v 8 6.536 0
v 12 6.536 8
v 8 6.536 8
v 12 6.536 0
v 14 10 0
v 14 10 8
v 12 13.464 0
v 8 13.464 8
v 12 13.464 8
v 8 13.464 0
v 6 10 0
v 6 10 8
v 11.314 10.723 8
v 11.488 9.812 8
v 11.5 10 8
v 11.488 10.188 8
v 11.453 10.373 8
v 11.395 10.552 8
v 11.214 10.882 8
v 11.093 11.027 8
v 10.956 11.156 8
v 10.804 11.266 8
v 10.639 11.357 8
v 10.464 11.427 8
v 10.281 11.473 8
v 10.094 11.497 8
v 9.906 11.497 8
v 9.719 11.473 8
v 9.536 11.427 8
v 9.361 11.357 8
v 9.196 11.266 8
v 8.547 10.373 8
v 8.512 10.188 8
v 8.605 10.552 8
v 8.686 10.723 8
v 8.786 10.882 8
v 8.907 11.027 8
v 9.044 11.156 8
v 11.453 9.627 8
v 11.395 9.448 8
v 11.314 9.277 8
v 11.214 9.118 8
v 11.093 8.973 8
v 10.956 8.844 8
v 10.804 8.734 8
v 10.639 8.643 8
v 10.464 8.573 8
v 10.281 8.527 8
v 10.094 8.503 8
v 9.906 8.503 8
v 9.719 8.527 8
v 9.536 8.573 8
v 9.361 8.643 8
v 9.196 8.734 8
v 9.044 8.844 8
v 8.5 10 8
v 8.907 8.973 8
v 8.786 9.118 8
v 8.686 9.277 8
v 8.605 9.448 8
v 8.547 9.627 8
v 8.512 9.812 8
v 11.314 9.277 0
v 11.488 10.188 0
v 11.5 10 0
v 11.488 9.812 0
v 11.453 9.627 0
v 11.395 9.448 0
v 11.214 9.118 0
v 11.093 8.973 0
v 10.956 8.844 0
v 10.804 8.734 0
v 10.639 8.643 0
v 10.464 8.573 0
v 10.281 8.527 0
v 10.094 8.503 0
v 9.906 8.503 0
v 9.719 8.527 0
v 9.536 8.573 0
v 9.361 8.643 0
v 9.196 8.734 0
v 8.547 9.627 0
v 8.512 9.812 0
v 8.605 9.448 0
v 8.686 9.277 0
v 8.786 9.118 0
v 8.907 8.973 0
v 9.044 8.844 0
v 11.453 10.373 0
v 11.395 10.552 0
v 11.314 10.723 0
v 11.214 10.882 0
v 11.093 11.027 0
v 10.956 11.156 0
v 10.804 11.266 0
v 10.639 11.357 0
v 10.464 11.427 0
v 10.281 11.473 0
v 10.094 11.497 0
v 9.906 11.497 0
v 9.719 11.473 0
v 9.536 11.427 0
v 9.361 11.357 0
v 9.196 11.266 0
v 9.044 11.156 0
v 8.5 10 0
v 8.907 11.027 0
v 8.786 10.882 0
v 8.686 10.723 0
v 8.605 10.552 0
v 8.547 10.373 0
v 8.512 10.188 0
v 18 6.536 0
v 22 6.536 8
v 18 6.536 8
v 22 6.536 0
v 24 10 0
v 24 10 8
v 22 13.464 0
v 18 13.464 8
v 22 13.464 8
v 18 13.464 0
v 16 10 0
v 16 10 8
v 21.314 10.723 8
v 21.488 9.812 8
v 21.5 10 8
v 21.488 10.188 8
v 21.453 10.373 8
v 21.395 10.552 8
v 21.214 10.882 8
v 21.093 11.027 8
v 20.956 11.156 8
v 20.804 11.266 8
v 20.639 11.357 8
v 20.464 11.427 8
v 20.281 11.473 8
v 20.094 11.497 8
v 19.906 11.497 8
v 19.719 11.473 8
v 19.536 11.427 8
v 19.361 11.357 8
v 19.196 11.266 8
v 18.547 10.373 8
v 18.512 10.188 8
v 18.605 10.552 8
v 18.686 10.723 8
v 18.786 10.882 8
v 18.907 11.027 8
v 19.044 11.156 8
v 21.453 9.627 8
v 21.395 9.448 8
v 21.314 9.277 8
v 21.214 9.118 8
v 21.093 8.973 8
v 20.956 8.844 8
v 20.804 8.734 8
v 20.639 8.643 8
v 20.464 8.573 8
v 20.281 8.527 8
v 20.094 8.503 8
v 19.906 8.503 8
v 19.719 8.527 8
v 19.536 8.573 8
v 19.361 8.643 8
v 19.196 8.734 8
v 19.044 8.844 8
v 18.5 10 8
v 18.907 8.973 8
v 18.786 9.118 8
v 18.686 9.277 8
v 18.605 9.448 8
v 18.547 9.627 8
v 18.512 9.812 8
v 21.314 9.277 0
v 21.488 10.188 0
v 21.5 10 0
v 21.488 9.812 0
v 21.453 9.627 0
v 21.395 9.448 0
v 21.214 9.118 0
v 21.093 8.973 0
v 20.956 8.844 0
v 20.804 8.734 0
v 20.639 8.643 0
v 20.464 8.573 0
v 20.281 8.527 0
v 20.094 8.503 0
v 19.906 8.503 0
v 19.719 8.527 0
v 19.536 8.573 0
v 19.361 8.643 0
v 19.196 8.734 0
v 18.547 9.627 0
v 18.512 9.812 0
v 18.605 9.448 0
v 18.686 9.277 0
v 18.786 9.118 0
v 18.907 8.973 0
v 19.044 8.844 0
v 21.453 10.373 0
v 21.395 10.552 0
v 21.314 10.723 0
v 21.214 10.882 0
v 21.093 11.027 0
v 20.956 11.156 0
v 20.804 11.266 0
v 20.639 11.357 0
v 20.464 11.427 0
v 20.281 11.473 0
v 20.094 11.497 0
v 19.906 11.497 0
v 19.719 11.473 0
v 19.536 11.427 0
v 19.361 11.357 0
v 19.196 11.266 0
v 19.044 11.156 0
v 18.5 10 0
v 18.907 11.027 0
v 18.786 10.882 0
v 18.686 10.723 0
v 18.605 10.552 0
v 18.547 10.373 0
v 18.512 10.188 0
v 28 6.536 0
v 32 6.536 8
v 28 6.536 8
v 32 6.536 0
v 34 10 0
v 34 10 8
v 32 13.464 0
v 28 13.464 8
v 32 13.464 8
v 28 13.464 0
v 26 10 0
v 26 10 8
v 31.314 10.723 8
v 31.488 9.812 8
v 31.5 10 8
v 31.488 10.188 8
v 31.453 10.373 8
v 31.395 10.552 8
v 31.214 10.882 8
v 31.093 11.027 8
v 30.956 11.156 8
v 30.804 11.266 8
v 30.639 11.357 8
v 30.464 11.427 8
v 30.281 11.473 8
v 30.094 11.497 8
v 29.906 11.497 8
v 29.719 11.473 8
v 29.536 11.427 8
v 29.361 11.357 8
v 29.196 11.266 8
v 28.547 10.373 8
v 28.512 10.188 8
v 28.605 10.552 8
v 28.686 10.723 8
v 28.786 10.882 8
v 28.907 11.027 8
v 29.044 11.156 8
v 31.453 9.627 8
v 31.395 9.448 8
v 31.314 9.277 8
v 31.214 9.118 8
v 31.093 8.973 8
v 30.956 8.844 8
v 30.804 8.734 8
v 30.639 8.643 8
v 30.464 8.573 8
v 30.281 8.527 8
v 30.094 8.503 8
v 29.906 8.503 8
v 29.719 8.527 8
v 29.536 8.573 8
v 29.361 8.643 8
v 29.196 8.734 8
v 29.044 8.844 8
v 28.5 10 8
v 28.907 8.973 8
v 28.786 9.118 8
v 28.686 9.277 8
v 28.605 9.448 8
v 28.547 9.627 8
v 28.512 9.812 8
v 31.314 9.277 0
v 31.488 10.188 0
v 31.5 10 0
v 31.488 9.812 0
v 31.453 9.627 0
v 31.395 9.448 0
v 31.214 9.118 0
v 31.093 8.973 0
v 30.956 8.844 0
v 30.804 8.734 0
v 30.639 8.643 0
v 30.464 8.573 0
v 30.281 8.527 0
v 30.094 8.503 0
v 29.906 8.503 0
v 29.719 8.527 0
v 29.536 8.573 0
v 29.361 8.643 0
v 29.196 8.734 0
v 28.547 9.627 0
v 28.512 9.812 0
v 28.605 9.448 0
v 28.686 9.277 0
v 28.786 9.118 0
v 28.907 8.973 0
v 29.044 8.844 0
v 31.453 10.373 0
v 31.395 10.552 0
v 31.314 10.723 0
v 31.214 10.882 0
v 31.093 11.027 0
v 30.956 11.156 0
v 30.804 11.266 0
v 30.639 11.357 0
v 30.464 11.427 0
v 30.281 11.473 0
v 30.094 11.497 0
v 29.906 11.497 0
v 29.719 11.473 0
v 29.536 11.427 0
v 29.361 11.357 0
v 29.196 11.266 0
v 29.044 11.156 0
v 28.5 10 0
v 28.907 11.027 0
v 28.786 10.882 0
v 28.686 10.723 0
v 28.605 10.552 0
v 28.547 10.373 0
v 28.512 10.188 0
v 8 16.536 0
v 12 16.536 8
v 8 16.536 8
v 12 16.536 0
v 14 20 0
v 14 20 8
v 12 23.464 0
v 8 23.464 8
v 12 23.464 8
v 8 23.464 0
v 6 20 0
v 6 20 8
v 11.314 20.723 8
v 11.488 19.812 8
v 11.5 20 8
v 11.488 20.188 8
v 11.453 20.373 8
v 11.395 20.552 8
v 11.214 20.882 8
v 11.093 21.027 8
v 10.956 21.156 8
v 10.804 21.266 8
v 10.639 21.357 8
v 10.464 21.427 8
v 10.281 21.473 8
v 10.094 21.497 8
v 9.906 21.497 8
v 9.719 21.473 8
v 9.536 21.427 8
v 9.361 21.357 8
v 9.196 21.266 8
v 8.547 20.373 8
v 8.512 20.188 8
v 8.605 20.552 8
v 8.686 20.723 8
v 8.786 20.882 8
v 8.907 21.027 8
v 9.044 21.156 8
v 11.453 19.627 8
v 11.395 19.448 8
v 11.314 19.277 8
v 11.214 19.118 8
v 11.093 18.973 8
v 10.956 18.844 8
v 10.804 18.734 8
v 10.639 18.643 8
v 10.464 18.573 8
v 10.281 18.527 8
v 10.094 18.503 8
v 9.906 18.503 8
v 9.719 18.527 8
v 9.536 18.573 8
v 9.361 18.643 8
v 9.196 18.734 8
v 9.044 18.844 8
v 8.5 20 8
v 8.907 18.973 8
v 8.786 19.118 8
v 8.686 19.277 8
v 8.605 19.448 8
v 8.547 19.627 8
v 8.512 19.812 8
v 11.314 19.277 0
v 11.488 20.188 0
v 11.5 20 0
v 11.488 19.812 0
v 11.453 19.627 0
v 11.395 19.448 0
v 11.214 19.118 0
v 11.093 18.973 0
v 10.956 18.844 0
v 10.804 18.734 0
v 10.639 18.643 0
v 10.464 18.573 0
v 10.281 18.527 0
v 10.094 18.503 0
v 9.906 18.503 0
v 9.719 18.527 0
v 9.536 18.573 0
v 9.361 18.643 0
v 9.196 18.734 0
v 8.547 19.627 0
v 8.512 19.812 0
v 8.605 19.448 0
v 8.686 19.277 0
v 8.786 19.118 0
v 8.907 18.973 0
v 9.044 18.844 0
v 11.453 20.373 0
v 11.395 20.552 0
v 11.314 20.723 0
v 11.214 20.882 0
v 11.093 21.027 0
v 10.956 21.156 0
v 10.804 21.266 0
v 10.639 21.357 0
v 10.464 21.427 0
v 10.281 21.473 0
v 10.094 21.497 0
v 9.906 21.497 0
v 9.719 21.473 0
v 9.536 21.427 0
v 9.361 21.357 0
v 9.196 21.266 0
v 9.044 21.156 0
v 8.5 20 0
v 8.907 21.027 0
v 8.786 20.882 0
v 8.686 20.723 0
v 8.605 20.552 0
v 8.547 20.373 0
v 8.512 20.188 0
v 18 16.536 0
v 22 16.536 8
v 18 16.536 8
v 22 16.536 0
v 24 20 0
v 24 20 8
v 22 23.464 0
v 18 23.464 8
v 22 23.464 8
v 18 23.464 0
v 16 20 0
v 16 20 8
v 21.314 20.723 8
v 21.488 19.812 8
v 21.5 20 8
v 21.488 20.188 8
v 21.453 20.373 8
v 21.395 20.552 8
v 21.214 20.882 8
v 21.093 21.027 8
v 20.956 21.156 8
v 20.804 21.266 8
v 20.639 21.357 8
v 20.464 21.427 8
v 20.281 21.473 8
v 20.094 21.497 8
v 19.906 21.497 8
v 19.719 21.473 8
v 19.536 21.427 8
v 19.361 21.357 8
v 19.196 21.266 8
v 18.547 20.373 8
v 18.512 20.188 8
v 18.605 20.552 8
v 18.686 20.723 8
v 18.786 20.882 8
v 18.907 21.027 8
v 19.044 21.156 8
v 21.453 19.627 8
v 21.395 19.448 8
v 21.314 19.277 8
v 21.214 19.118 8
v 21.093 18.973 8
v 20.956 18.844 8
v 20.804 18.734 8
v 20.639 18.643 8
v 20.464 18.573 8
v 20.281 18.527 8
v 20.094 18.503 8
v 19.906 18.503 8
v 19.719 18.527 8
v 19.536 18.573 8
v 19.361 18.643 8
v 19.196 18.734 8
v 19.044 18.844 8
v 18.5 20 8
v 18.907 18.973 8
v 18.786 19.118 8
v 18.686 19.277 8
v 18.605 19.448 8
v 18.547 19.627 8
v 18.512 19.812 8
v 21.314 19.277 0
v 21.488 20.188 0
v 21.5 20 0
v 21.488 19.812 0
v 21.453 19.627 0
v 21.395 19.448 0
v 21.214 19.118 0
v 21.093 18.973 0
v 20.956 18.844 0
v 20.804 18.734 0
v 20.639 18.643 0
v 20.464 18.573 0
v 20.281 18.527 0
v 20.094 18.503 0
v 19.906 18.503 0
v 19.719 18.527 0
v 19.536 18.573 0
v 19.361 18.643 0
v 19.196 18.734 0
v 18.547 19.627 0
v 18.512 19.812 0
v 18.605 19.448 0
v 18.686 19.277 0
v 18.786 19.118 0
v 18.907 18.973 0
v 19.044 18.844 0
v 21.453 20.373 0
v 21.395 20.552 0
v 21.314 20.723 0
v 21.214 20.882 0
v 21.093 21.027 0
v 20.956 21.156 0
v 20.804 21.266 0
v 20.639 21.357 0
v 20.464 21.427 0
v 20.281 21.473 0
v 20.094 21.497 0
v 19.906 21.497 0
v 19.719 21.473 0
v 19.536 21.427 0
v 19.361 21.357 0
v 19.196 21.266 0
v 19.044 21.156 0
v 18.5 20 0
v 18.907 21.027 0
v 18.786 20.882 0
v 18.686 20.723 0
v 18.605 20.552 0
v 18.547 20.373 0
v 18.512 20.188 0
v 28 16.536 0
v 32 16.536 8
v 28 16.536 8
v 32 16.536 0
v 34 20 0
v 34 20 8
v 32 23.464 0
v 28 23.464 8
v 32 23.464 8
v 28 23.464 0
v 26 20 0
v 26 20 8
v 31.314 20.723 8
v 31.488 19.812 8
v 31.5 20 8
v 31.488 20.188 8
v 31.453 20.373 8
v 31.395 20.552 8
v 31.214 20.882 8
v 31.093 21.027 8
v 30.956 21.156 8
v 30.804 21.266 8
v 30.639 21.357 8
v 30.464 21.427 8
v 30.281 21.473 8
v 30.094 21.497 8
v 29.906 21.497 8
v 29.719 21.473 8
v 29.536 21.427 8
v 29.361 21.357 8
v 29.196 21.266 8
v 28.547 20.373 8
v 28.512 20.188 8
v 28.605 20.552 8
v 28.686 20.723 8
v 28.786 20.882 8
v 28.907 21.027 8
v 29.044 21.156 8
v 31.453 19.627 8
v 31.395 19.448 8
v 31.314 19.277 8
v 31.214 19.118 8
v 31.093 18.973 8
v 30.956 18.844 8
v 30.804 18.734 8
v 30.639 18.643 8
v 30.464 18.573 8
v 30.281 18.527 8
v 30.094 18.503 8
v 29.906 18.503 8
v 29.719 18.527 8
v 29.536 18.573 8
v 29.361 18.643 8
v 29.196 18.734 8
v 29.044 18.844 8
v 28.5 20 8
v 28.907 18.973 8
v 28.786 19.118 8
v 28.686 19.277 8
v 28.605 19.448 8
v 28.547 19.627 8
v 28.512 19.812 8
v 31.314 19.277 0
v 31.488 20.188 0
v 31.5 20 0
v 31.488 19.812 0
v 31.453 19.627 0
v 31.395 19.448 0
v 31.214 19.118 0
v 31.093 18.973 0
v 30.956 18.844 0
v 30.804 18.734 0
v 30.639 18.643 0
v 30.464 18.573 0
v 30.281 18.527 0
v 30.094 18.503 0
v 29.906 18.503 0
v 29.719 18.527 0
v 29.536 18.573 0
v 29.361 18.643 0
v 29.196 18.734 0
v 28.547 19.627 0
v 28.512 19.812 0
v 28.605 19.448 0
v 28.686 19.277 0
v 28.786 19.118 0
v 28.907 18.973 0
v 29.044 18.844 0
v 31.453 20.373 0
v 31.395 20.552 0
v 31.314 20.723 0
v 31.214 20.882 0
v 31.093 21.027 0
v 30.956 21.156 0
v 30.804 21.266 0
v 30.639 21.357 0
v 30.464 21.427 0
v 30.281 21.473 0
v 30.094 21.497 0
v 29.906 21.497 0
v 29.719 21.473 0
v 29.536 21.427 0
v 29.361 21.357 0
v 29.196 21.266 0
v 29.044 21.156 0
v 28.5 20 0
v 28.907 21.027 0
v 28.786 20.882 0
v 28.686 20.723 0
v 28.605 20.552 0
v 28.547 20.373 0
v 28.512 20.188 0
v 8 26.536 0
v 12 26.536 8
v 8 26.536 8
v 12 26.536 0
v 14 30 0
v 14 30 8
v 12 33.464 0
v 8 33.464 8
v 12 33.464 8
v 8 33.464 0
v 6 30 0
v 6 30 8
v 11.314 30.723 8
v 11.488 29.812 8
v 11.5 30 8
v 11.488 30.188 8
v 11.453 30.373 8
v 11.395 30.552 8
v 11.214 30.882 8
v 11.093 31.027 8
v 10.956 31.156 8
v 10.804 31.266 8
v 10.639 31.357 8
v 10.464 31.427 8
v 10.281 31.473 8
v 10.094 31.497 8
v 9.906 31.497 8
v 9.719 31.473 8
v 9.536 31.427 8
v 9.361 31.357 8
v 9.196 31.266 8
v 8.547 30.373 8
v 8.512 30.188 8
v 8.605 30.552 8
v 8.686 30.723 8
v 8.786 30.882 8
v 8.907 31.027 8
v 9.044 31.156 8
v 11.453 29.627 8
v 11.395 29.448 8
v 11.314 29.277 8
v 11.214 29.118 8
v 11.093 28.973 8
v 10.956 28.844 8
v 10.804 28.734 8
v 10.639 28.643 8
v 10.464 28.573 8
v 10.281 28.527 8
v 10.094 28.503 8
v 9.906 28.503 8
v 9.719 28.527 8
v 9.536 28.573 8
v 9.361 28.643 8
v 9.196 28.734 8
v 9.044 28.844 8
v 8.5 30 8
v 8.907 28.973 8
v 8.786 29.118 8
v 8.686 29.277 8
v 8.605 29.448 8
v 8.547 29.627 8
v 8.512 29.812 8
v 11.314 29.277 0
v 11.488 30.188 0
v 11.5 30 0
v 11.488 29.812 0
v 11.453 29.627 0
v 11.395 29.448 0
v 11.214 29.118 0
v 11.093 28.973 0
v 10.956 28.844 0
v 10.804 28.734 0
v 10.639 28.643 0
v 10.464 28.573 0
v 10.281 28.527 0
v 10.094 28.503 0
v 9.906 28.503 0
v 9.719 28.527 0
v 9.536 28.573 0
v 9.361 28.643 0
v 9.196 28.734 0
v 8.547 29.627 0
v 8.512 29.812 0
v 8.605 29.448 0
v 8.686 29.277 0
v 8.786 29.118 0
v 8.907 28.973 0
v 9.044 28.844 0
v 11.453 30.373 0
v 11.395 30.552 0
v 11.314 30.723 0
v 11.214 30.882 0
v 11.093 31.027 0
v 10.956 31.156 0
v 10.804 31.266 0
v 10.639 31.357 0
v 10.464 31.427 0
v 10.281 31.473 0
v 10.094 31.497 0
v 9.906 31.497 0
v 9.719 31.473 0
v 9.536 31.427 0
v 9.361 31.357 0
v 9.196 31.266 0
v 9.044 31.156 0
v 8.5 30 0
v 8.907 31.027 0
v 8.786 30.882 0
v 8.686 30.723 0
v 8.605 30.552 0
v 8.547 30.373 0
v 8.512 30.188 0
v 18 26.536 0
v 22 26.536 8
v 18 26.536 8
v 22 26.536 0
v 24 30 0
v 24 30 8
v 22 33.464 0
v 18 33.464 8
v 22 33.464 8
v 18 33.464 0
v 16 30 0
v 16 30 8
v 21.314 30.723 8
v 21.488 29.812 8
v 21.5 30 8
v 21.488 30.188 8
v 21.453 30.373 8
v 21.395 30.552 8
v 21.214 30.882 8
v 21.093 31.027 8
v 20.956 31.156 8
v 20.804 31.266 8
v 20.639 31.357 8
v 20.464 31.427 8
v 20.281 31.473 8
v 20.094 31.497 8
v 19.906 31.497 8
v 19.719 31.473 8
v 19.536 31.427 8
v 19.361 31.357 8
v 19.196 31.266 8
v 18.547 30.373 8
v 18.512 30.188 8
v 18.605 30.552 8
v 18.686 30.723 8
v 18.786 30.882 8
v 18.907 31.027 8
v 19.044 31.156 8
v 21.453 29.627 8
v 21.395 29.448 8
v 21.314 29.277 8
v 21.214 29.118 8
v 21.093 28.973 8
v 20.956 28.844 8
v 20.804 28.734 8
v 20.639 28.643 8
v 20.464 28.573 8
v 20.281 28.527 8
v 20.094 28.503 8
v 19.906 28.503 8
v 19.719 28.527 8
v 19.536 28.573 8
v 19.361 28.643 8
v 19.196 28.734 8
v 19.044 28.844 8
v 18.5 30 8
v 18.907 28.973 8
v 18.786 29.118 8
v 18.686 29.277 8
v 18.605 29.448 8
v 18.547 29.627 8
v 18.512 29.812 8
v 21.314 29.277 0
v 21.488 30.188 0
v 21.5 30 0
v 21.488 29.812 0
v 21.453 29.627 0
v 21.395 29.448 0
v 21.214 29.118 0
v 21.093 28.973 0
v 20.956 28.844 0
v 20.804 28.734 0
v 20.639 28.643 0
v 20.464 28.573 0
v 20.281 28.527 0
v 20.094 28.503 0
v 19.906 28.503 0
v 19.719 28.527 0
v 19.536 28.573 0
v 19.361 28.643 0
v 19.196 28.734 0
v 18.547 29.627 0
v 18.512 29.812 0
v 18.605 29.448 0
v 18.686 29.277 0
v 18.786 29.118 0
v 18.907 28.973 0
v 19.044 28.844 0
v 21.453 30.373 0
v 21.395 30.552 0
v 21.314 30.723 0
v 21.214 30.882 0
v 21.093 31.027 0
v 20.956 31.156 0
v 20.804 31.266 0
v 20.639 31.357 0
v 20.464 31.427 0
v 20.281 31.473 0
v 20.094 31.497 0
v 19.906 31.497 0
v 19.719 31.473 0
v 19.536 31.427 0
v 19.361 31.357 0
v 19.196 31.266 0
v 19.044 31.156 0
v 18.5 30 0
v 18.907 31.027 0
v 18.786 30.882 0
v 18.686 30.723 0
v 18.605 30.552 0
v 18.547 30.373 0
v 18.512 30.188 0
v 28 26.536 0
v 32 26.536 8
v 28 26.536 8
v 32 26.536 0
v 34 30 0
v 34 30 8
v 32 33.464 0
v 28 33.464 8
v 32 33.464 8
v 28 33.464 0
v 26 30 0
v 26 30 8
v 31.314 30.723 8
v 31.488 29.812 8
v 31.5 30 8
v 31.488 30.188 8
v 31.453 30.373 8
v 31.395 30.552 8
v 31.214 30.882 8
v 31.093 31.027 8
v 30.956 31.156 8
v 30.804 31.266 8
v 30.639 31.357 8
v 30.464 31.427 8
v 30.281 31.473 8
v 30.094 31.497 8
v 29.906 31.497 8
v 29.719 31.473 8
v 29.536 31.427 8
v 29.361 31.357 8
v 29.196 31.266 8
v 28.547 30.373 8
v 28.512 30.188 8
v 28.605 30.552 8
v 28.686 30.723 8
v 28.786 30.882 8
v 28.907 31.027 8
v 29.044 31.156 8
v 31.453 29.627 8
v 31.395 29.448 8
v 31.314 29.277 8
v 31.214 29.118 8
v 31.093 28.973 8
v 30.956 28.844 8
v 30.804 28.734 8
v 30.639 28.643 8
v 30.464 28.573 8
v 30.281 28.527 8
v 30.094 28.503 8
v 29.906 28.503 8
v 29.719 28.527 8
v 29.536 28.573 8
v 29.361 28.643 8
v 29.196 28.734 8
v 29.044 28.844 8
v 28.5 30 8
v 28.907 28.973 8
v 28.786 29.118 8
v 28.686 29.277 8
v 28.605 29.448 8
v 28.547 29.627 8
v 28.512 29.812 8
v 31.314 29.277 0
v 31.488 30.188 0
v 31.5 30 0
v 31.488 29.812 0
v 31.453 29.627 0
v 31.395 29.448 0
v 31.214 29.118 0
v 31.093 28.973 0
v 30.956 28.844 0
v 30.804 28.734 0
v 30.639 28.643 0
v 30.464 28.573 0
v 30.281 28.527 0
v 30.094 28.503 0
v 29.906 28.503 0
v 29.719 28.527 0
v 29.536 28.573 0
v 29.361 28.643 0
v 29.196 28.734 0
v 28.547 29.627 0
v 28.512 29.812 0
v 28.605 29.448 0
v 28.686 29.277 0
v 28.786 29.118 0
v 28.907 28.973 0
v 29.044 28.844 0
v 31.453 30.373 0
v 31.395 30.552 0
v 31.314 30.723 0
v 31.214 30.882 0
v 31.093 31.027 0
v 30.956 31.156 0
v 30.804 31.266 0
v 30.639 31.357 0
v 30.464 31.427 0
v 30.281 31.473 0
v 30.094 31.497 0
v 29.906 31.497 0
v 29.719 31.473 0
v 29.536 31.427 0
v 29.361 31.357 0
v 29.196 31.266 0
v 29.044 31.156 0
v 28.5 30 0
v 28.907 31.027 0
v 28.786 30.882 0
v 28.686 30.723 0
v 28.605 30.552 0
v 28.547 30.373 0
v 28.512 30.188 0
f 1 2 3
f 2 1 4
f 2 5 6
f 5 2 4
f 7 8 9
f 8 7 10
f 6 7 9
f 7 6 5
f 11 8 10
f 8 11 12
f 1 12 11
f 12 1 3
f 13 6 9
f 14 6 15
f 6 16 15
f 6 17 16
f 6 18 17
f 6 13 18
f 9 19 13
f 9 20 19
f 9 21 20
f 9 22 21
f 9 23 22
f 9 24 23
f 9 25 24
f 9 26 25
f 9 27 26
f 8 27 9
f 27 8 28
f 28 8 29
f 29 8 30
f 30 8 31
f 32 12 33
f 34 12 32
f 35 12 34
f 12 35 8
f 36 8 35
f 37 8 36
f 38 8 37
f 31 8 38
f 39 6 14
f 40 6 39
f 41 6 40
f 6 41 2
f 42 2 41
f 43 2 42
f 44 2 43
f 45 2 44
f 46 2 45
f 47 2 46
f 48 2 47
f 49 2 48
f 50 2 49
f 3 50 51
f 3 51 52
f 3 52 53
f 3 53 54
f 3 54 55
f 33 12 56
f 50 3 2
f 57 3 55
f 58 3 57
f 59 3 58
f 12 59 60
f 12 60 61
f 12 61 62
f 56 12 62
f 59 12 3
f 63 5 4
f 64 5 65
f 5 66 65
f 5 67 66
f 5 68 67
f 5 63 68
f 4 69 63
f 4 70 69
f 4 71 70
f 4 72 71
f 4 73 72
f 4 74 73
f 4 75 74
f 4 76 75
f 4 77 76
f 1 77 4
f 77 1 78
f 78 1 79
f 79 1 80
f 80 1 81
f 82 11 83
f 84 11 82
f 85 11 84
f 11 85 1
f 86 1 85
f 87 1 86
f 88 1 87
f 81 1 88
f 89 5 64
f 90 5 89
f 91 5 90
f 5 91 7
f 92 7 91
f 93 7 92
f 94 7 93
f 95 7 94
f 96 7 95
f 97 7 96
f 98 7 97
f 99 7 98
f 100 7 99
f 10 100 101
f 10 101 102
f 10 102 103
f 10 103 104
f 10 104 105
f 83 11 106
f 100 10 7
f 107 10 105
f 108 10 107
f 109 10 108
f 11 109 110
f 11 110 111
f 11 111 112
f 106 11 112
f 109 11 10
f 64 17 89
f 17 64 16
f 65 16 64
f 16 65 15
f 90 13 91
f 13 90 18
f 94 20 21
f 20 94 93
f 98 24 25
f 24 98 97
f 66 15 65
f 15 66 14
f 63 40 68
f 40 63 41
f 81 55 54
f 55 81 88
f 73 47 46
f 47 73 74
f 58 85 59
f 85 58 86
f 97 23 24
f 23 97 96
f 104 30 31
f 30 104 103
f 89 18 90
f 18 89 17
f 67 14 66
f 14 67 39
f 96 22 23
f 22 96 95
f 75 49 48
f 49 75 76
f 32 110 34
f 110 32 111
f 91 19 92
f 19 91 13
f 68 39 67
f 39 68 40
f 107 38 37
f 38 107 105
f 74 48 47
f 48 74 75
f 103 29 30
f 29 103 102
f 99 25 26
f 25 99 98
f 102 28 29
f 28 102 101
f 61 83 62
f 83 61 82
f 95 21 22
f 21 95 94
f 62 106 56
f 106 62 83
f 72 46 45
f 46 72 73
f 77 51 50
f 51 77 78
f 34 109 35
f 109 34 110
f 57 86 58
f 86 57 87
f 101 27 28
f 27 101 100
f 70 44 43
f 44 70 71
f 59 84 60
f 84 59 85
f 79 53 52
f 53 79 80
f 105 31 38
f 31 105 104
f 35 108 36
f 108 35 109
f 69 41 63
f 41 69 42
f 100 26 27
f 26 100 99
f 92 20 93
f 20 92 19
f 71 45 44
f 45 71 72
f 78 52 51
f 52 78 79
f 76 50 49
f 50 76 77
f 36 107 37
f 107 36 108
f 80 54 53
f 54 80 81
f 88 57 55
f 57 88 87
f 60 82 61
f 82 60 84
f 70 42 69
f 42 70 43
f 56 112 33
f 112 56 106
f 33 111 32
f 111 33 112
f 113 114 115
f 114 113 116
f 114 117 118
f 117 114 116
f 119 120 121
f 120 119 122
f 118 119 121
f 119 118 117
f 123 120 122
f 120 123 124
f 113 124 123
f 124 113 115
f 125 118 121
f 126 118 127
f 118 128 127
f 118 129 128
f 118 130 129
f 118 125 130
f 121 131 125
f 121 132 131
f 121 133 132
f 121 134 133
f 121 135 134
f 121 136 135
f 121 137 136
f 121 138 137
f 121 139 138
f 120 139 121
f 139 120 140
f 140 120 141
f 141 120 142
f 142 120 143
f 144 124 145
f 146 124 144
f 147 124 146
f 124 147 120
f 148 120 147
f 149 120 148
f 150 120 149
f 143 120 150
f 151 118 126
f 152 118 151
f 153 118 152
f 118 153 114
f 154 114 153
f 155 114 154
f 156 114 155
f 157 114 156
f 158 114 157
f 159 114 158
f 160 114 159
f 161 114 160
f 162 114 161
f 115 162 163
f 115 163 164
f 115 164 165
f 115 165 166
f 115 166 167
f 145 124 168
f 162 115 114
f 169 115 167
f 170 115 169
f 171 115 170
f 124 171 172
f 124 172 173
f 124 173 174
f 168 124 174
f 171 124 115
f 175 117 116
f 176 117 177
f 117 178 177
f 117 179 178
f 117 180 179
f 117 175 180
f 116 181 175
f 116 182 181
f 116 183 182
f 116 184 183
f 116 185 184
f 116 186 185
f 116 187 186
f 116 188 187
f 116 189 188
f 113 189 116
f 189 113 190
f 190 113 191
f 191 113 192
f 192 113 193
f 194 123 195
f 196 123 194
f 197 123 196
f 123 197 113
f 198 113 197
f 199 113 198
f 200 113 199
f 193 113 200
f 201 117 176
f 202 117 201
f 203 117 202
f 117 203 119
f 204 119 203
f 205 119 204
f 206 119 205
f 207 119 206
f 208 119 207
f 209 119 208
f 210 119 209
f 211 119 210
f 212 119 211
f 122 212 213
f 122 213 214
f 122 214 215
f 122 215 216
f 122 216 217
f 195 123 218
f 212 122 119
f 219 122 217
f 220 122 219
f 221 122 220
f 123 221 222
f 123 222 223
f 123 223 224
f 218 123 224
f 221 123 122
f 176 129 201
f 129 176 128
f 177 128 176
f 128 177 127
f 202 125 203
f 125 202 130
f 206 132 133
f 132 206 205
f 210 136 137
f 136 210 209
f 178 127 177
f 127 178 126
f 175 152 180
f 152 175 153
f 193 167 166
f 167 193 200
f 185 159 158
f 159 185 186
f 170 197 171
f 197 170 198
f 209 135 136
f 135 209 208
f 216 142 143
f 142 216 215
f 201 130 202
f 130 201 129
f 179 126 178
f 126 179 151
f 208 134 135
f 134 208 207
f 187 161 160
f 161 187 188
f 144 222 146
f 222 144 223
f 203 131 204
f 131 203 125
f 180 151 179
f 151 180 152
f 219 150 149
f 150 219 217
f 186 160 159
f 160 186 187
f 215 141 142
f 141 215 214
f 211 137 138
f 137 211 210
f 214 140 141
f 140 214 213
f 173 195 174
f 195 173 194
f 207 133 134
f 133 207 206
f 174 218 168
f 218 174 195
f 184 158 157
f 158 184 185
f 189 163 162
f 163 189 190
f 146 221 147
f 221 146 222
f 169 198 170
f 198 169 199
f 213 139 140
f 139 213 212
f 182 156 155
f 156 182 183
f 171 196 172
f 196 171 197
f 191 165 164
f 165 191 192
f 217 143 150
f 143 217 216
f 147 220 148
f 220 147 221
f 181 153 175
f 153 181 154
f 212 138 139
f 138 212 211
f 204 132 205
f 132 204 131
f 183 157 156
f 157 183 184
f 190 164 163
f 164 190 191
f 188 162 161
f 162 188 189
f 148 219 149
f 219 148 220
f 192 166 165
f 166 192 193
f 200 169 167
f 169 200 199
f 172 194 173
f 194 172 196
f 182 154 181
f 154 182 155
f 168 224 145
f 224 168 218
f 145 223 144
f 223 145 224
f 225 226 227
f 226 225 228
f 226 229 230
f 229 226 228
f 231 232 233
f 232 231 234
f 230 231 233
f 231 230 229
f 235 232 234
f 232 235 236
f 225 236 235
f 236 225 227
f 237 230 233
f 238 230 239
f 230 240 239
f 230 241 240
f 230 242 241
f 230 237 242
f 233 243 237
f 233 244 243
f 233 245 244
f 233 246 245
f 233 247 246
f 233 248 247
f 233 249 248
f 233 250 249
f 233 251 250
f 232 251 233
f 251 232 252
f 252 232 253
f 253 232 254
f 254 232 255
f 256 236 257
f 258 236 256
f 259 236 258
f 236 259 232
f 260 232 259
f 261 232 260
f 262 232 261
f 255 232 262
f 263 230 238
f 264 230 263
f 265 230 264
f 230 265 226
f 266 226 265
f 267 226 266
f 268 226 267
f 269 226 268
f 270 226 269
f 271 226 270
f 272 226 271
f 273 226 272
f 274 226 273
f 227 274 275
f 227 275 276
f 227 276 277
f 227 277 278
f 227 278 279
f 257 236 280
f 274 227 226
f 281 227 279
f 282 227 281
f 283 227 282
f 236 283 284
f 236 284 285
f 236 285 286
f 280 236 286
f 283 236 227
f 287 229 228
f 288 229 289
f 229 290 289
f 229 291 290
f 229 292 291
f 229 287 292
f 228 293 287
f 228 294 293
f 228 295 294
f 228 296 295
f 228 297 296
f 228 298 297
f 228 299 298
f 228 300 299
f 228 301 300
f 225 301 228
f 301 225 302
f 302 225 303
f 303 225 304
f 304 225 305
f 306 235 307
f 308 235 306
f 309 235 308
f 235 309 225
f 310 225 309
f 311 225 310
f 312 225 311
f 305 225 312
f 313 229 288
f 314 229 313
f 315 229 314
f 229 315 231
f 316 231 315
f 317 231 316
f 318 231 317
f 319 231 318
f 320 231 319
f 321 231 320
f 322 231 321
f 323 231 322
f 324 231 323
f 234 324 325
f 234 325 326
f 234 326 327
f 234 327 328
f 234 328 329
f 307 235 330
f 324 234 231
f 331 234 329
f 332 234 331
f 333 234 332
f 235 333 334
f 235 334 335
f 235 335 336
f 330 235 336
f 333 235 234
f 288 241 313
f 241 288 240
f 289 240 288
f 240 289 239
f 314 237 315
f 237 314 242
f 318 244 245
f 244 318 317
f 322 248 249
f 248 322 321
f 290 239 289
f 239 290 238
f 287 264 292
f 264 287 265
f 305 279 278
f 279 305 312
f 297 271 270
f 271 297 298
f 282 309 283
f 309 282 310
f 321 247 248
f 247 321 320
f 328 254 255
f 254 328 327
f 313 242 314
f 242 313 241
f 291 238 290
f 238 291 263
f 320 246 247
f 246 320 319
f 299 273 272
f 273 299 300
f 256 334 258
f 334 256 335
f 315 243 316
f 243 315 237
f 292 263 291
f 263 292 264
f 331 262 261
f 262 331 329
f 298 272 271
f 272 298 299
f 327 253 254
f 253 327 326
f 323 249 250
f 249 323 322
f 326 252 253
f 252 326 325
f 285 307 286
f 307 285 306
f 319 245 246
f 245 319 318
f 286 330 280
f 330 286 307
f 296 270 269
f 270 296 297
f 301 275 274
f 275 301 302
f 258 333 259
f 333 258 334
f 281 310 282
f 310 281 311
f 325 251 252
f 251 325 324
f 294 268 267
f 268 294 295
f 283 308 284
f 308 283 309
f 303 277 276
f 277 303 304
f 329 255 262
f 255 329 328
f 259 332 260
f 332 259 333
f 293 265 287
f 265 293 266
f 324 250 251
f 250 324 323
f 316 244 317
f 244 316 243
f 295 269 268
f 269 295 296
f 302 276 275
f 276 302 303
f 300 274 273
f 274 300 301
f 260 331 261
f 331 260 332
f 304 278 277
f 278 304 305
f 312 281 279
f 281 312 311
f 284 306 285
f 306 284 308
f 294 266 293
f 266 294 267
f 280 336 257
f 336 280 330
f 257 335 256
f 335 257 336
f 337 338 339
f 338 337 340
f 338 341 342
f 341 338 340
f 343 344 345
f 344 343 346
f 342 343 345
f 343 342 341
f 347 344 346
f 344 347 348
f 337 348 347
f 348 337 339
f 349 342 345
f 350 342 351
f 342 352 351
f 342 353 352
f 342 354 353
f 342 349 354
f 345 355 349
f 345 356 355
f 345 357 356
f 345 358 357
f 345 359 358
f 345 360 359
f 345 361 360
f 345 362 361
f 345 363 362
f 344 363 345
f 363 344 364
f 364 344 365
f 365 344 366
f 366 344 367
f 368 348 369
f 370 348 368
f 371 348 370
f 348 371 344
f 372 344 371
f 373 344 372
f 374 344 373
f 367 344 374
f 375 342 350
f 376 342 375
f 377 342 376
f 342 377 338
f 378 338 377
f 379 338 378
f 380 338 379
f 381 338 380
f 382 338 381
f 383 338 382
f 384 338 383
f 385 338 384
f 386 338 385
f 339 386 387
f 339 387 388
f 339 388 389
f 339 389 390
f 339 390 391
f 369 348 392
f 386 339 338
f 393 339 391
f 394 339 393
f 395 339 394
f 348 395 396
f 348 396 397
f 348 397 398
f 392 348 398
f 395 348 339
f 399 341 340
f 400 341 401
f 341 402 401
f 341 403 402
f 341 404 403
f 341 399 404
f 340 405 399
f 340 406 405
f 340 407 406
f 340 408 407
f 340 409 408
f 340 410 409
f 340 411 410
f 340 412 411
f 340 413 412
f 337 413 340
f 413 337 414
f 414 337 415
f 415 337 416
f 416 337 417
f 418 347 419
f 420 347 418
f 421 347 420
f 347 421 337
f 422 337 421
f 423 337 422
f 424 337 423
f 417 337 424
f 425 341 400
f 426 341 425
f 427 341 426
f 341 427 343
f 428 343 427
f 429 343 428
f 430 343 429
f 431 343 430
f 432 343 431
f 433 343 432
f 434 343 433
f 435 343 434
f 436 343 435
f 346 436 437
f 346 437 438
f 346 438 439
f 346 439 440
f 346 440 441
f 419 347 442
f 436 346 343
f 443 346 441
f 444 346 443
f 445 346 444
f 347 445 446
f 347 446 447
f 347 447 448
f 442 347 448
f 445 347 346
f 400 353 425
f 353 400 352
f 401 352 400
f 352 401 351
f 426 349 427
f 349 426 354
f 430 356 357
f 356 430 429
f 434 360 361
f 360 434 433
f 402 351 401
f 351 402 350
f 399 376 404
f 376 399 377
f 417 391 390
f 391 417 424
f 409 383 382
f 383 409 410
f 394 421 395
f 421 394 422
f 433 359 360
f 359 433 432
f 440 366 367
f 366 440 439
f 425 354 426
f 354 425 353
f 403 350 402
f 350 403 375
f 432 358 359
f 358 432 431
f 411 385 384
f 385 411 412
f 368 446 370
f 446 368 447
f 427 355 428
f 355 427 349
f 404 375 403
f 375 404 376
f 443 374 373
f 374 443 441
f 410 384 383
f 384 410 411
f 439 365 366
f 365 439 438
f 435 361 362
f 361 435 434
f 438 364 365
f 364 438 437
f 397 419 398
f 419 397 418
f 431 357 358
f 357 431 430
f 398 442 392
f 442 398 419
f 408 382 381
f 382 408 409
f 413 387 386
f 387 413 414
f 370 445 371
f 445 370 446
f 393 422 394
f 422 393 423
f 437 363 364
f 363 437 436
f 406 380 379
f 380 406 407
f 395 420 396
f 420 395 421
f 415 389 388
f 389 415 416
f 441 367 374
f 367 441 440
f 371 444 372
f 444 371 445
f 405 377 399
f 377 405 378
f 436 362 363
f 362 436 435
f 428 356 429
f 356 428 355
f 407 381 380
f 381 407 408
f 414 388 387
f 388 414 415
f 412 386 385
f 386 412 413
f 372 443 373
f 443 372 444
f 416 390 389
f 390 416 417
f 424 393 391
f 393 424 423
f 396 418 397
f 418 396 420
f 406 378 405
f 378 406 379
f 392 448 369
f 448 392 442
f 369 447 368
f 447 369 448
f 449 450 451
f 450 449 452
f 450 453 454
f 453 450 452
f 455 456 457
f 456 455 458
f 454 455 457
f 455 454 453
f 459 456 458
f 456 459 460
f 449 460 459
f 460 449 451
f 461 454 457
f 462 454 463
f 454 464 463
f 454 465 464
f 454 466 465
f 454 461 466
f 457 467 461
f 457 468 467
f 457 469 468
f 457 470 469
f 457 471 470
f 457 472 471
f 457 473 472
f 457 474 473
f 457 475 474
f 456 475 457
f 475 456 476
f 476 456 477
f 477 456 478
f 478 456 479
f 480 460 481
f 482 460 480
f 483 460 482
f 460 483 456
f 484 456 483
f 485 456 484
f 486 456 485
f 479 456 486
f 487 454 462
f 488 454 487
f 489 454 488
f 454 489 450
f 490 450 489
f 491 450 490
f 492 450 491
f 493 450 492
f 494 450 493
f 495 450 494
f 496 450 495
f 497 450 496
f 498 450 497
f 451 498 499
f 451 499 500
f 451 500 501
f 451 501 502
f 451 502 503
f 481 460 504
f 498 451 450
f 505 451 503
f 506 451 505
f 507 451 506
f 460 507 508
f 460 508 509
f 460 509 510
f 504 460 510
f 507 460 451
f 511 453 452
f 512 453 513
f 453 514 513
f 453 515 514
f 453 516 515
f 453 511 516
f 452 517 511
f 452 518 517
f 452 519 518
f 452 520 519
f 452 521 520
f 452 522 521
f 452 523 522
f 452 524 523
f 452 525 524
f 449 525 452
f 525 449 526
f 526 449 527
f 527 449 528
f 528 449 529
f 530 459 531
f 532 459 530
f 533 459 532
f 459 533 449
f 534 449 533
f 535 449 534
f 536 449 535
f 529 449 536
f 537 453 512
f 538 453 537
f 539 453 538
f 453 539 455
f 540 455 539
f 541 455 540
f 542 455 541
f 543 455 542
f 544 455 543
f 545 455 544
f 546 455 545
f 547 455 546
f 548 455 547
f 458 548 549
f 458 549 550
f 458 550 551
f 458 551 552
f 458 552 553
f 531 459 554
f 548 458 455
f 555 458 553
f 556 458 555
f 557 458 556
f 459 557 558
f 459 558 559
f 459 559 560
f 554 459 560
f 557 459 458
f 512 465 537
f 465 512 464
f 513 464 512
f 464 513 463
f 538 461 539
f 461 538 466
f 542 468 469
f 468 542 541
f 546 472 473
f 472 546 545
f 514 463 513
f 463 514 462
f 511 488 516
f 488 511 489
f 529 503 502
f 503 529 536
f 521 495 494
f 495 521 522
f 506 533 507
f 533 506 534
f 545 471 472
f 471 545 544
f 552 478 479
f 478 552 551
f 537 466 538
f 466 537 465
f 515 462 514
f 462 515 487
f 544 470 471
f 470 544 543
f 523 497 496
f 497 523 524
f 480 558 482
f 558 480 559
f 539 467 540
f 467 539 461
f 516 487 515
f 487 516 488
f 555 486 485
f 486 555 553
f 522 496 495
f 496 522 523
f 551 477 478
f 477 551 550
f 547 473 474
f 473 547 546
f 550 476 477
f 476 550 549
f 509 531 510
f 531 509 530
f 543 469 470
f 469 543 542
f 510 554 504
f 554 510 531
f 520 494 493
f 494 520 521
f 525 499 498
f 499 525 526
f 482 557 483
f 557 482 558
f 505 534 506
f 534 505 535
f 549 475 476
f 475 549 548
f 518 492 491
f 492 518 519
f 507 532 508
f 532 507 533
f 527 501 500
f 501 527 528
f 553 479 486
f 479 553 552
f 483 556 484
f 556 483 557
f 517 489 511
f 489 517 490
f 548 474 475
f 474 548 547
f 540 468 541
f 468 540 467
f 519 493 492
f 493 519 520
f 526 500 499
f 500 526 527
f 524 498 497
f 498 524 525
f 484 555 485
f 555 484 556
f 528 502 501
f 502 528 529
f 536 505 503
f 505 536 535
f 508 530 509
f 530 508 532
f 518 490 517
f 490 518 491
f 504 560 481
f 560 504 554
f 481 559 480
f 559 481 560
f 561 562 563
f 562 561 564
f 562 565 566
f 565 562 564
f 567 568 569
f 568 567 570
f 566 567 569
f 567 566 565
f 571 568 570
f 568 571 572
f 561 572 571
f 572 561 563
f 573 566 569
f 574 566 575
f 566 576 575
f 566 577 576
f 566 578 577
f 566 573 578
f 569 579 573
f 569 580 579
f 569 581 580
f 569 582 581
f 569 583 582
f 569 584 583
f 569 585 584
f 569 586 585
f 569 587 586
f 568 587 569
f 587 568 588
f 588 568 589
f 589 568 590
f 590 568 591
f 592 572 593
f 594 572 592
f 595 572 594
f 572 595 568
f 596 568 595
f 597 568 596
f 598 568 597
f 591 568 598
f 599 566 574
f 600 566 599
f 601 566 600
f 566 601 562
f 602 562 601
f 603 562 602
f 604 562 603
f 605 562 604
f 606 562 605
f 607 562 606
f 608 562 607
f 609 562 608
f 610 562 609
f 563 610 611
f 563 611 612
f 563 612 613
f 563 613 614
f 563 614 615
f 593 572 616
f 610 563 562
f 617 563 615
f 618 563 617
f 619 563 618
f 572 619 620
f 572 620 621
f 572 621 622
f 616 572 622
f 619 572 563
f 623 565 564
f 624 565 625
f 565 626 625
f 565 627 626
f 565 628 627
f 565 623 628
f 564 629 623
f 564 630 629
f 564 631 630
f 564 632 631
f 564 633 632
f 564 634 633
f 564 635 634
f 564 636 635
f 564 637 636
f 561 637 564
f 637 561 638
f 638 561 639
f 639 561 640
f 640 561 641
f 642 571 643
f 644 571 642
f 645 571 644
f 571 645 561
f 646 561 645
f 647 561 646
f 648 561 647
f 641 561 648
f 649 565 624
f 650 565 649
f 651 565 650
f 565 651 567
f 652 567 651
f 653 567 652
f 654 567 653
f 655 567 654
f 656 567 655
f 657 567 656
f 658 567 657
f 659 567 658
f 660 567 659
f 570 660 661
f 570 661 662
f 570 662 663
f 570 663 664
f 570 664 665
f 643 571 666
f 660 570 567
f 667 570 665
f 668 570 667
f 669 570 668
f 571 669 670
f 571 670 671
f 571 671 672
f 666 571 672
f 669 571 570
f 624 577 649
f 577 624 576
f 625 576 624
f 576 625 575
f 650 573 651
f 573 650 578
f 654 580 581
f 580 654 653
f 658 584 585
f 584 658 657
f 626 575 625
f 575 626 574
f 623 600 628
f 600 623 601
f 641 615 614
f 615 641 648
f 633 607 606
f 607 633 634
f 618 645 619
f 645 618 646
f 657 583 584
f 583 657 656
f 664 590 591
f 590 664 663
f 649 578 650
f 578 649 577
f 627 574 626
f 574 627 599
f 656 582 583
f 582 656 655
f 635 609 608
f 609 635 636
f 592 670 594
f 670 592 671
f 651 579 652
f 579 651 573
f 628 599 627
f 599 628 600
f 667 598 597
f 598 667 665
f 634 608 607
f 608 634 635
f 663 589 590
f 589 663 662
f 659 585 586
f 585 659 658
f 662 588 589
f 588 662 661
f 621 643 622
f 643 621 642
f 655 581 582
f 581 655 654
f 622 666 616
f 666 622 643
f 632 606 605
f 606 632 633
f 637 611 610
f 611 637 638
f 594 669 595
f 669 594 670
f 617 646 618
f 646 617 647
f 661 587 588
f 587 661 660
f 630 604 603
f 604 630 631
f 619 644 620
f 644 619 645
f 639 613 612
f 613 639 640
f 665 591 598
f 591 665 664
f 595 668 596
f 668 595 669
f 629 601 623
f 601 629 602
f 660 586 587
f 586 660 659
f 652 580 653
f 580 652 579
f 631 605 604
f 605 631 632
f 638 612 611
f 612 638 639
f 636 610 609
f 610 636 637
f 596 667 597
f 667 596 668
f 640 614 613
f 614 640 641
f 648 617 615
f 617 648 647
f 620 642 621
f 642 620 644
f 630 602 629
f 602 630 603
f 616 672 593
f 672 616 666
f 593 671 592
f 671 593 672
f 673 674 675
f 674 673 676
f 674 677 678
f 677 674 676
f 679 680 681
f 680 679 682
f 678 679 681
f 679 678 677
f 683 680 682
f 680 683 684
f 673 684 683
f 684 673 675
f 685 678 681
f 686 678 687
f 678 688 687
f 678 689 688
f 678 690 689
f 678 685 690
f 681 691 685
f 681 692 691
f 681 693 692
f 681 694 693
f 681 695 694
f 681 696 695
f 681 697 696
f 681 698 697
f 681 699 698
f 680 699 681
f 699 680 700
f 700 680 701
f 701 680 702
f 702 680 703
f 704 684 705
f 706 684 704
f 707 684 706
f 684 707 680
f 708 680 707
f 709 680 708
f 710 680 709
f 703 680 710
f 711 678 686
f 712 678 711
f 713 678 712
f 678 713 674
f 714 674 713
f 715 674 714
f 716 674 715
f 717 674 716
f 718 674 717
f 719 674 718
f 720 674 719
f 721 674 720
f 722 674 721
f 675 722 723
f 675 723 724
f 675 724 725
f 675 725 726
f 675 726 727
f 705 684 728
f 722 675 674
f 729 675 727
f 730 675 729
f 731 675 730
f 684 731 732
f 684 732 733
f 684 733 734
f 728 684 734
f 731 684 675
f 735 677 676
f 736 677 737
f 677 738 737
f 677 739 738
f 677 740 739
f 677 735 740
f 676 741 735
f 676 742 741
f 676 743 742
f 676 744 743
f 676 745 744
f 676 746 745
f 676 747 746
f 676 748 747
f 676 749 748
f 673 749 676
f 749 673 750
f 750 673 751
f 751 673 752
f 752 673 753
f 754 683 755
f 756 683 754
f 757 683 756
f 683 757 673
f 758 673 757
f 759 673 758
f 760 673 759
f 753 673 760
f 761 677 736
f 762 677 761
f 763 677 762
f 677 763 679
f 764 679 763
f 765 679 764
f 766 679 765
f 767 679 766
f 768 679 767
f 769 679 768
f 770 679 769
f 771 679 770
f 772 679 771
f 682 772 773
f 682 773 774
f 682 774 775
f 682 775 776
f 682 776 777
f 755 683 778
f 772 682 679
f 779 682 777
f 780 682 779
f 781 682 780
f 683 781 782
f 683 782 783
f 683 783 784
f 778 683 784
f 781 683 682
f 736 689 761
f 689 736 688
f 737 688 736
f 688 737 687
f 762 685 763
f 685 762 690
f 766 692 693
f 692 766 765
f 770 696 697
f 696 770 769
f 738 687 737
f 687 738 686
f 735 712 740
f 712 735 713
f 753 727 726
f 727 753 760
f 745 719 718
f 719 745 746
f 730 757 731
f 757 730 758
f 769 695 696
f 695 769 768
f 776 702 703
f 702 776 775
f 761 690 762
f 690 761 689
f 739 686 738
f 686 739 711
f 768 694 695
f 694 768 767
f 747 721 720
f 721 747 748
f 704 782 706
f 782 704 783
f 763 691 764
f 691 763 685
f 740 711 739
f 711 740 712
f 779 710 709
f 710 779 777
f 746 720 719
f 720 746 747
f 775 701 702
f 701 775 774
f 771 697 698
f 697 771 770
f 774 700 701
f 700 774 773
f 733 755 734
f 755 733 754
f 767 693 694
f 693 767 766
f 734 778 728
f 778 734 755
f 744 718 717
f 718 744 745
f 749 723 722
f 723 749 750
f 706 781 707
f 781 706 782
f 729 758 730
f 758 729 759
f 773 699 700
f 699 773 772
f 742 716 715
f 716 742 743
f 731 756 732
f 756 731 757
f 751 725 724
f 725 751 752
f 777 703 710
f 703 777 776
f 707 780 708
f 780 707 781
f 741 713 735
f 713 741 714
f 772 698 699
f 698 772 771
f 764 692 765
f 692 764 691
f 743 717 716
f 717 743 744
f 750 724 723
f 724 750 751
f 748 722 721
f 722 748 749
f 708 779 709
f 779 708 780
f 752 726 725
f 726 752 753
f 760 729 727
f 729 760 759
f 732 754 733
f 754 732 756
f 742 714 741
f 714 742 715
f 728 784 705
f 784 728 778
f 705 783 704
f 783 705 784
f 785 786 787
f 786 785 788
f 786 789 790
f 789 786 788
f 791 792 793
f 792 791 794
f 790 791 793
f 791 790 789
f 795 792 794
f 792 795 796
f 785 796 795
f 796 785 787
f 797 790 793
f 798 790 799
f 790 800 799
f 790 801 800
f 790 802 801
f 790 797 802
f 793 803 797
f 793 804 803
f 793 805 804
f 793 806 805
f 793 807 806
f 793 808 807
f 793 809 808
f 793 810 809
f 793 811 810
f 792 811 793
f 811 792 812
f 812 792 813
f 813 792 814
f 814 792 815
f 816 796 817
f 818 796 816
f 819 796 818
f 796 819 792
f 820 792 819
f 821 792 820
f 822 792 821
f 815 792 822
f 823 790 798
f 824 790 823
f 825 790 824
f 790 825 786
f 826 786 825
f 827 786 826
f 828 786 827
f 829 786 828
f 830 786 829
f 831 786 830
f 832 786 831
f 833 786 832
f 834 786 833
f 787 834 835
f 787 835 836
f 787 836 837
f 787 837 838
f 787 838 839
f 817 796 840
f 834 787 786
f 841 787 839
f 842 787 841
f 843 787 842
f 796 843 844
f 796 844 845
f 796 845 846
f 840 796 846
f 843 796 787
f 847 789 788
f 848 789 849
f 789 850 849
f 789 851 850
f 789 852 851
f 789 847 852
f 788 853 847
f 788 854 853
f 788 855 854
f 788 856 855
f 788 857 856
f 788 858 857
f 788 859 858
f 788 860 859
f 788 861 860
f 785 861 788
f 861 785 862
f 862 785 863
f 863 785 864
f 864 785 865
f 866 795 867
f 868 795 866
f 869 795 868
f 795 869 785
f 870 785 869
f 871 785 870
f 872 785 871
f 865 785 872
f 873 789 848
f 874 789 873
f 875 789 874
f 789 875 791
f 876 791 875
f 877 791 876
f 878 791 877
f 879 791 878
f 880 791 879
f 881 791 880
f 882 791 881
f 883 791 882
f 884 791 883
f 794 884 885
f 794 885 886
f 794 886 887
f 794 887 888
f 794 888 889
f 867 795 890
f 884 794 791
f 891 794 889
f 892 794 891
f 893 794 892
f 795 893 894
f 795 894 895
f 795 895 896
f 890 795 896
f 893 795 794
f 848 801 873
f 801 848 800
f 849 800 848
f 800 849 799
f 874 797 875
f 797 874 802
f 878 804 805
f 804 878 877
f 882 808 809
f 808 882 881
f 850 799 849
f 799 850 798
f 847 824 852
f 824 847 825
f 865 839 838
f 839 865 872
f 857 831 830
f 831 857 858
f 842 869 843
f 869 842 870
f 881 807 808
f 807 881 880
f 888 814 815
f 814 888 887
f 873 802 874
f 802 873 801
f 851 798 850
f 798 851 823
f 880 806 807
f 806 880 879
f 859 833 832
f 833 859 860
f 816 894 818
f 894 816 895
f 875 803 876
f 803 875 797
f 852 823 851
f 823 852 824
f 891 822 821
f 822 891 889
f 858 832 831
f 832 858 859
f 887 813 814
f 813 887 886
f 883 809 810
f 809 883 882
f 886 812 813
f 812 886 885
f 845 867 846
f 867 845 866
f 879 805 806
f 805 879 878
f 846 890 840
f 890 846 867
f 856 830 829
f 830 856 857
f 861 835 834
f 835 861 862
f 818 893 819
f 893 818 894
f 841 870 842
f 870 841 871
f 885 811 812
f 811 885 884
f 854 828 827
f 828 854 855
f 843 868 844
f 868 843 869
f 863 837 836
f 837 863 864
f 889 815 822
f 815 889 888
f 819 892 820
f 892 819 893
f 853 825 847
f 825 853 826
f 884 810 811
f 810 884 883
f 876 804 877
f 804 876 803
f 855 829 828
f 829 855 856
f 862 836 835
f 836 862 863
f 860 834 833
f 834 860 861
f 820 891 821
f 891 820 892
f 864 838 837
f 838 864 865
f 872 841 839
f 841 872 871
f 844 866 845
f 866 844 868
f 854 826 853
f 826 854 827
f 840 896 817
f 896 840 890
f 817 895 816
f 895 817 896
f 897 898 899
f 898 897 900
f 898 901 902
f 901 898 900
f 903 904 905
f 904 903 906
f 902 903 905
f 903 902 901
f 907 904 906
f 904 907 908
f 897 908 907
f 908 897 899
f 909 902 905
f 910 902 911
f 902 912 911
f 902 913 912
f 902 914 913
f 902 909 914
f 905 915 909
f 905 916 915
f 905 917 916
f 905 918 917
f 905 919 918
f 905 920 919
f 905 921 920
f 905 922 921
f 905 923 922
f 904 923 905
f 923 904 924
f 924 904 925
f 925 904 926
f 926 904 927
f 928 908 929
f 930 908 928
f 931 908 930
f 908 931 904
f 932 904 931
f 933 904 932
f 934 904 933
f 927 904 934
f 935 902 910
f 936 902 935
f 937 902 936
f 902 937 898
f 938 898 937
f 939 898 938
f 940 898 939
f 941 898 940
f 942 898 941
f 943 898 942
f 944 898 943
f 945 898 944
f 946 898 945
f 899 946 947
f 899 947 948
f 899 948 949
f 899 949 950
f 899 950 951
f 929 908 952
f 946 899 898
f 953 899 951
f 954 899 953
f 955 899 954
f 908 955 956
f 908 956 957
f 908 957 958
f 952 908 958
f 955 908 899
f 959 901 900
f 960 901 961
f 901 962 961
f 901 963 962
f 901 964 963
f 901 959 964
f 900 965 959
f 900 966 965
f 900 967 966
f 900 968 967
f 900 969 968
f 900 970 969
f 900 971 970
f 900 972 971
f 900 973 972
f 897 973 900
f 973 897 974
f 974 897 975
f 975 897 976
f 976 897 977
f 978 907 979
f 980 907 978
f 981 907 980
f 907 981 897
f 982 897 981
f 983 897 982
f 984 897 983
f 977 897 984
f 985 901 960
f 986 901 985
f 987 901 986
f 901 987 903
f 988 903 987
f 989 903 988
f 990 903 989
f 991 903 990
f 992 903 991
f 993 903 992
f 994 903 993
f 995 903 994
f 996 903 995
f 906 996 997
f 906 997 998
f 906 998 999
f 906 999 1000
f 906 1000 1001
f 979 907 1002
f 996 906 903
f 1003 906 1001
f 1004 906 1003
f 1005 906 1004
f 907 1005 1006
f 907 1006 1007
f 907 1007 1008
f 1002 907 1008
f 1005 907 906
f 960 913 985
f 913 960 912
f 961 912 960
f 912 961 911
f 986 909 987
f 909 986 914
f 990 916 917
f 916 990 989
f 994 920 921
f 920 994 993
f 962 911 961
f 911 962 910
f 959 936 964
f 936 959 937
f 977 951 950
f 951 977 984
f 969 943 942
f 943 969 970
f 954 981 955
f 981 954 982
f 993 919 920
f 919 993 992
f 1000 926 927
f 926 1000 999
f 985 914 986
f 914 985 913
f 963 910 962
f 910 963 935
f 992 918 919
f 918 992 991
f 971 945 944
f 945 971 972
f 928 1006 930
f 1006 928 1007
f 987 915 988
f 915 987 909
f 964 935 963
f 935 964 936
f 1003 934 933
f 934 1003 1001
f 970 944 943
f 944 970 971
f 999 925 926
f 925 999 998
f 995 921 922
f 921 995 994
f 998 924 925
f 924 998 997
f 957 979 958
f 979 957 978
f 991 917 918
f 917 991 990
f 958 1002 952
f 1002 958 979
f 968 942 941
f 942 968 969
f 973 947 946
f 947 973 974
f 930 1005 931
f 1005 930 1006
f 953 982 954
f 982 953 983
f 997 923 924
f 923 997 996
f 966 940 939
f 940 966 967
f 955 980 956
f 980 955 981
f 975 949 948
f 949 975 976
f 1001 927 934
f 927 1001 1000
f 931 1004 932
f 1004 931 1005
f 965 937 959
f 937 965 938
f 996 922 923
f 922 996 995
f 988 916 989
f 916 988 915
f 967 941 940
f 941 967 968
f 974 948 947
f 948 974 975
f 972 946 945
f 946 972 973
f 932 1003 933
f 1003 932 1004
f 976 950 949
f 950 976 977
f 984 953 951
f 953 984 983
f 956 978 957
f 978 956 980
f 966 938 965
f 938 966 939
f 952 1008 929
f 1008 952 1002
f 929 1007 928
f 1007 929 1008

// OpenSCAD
hole_r = 1.5;
hex_r = 4; 
hex_Height = 8;
Rows = 3;
Cols= 3;

module pcbstand() {
difference() {
    cylinder(r=hex_r,h=hex_Height,$fn=6);
    translate([0,0,-1])cylinder(r=hole_r,h=hex_Height+2,$fn=50);

}
}
for (y=[1:Cols])
    for (x=[1:Rows])
        translate([x*((hex_r*2)+2),y*((hex_r*2)+2),0])pcbstand();
